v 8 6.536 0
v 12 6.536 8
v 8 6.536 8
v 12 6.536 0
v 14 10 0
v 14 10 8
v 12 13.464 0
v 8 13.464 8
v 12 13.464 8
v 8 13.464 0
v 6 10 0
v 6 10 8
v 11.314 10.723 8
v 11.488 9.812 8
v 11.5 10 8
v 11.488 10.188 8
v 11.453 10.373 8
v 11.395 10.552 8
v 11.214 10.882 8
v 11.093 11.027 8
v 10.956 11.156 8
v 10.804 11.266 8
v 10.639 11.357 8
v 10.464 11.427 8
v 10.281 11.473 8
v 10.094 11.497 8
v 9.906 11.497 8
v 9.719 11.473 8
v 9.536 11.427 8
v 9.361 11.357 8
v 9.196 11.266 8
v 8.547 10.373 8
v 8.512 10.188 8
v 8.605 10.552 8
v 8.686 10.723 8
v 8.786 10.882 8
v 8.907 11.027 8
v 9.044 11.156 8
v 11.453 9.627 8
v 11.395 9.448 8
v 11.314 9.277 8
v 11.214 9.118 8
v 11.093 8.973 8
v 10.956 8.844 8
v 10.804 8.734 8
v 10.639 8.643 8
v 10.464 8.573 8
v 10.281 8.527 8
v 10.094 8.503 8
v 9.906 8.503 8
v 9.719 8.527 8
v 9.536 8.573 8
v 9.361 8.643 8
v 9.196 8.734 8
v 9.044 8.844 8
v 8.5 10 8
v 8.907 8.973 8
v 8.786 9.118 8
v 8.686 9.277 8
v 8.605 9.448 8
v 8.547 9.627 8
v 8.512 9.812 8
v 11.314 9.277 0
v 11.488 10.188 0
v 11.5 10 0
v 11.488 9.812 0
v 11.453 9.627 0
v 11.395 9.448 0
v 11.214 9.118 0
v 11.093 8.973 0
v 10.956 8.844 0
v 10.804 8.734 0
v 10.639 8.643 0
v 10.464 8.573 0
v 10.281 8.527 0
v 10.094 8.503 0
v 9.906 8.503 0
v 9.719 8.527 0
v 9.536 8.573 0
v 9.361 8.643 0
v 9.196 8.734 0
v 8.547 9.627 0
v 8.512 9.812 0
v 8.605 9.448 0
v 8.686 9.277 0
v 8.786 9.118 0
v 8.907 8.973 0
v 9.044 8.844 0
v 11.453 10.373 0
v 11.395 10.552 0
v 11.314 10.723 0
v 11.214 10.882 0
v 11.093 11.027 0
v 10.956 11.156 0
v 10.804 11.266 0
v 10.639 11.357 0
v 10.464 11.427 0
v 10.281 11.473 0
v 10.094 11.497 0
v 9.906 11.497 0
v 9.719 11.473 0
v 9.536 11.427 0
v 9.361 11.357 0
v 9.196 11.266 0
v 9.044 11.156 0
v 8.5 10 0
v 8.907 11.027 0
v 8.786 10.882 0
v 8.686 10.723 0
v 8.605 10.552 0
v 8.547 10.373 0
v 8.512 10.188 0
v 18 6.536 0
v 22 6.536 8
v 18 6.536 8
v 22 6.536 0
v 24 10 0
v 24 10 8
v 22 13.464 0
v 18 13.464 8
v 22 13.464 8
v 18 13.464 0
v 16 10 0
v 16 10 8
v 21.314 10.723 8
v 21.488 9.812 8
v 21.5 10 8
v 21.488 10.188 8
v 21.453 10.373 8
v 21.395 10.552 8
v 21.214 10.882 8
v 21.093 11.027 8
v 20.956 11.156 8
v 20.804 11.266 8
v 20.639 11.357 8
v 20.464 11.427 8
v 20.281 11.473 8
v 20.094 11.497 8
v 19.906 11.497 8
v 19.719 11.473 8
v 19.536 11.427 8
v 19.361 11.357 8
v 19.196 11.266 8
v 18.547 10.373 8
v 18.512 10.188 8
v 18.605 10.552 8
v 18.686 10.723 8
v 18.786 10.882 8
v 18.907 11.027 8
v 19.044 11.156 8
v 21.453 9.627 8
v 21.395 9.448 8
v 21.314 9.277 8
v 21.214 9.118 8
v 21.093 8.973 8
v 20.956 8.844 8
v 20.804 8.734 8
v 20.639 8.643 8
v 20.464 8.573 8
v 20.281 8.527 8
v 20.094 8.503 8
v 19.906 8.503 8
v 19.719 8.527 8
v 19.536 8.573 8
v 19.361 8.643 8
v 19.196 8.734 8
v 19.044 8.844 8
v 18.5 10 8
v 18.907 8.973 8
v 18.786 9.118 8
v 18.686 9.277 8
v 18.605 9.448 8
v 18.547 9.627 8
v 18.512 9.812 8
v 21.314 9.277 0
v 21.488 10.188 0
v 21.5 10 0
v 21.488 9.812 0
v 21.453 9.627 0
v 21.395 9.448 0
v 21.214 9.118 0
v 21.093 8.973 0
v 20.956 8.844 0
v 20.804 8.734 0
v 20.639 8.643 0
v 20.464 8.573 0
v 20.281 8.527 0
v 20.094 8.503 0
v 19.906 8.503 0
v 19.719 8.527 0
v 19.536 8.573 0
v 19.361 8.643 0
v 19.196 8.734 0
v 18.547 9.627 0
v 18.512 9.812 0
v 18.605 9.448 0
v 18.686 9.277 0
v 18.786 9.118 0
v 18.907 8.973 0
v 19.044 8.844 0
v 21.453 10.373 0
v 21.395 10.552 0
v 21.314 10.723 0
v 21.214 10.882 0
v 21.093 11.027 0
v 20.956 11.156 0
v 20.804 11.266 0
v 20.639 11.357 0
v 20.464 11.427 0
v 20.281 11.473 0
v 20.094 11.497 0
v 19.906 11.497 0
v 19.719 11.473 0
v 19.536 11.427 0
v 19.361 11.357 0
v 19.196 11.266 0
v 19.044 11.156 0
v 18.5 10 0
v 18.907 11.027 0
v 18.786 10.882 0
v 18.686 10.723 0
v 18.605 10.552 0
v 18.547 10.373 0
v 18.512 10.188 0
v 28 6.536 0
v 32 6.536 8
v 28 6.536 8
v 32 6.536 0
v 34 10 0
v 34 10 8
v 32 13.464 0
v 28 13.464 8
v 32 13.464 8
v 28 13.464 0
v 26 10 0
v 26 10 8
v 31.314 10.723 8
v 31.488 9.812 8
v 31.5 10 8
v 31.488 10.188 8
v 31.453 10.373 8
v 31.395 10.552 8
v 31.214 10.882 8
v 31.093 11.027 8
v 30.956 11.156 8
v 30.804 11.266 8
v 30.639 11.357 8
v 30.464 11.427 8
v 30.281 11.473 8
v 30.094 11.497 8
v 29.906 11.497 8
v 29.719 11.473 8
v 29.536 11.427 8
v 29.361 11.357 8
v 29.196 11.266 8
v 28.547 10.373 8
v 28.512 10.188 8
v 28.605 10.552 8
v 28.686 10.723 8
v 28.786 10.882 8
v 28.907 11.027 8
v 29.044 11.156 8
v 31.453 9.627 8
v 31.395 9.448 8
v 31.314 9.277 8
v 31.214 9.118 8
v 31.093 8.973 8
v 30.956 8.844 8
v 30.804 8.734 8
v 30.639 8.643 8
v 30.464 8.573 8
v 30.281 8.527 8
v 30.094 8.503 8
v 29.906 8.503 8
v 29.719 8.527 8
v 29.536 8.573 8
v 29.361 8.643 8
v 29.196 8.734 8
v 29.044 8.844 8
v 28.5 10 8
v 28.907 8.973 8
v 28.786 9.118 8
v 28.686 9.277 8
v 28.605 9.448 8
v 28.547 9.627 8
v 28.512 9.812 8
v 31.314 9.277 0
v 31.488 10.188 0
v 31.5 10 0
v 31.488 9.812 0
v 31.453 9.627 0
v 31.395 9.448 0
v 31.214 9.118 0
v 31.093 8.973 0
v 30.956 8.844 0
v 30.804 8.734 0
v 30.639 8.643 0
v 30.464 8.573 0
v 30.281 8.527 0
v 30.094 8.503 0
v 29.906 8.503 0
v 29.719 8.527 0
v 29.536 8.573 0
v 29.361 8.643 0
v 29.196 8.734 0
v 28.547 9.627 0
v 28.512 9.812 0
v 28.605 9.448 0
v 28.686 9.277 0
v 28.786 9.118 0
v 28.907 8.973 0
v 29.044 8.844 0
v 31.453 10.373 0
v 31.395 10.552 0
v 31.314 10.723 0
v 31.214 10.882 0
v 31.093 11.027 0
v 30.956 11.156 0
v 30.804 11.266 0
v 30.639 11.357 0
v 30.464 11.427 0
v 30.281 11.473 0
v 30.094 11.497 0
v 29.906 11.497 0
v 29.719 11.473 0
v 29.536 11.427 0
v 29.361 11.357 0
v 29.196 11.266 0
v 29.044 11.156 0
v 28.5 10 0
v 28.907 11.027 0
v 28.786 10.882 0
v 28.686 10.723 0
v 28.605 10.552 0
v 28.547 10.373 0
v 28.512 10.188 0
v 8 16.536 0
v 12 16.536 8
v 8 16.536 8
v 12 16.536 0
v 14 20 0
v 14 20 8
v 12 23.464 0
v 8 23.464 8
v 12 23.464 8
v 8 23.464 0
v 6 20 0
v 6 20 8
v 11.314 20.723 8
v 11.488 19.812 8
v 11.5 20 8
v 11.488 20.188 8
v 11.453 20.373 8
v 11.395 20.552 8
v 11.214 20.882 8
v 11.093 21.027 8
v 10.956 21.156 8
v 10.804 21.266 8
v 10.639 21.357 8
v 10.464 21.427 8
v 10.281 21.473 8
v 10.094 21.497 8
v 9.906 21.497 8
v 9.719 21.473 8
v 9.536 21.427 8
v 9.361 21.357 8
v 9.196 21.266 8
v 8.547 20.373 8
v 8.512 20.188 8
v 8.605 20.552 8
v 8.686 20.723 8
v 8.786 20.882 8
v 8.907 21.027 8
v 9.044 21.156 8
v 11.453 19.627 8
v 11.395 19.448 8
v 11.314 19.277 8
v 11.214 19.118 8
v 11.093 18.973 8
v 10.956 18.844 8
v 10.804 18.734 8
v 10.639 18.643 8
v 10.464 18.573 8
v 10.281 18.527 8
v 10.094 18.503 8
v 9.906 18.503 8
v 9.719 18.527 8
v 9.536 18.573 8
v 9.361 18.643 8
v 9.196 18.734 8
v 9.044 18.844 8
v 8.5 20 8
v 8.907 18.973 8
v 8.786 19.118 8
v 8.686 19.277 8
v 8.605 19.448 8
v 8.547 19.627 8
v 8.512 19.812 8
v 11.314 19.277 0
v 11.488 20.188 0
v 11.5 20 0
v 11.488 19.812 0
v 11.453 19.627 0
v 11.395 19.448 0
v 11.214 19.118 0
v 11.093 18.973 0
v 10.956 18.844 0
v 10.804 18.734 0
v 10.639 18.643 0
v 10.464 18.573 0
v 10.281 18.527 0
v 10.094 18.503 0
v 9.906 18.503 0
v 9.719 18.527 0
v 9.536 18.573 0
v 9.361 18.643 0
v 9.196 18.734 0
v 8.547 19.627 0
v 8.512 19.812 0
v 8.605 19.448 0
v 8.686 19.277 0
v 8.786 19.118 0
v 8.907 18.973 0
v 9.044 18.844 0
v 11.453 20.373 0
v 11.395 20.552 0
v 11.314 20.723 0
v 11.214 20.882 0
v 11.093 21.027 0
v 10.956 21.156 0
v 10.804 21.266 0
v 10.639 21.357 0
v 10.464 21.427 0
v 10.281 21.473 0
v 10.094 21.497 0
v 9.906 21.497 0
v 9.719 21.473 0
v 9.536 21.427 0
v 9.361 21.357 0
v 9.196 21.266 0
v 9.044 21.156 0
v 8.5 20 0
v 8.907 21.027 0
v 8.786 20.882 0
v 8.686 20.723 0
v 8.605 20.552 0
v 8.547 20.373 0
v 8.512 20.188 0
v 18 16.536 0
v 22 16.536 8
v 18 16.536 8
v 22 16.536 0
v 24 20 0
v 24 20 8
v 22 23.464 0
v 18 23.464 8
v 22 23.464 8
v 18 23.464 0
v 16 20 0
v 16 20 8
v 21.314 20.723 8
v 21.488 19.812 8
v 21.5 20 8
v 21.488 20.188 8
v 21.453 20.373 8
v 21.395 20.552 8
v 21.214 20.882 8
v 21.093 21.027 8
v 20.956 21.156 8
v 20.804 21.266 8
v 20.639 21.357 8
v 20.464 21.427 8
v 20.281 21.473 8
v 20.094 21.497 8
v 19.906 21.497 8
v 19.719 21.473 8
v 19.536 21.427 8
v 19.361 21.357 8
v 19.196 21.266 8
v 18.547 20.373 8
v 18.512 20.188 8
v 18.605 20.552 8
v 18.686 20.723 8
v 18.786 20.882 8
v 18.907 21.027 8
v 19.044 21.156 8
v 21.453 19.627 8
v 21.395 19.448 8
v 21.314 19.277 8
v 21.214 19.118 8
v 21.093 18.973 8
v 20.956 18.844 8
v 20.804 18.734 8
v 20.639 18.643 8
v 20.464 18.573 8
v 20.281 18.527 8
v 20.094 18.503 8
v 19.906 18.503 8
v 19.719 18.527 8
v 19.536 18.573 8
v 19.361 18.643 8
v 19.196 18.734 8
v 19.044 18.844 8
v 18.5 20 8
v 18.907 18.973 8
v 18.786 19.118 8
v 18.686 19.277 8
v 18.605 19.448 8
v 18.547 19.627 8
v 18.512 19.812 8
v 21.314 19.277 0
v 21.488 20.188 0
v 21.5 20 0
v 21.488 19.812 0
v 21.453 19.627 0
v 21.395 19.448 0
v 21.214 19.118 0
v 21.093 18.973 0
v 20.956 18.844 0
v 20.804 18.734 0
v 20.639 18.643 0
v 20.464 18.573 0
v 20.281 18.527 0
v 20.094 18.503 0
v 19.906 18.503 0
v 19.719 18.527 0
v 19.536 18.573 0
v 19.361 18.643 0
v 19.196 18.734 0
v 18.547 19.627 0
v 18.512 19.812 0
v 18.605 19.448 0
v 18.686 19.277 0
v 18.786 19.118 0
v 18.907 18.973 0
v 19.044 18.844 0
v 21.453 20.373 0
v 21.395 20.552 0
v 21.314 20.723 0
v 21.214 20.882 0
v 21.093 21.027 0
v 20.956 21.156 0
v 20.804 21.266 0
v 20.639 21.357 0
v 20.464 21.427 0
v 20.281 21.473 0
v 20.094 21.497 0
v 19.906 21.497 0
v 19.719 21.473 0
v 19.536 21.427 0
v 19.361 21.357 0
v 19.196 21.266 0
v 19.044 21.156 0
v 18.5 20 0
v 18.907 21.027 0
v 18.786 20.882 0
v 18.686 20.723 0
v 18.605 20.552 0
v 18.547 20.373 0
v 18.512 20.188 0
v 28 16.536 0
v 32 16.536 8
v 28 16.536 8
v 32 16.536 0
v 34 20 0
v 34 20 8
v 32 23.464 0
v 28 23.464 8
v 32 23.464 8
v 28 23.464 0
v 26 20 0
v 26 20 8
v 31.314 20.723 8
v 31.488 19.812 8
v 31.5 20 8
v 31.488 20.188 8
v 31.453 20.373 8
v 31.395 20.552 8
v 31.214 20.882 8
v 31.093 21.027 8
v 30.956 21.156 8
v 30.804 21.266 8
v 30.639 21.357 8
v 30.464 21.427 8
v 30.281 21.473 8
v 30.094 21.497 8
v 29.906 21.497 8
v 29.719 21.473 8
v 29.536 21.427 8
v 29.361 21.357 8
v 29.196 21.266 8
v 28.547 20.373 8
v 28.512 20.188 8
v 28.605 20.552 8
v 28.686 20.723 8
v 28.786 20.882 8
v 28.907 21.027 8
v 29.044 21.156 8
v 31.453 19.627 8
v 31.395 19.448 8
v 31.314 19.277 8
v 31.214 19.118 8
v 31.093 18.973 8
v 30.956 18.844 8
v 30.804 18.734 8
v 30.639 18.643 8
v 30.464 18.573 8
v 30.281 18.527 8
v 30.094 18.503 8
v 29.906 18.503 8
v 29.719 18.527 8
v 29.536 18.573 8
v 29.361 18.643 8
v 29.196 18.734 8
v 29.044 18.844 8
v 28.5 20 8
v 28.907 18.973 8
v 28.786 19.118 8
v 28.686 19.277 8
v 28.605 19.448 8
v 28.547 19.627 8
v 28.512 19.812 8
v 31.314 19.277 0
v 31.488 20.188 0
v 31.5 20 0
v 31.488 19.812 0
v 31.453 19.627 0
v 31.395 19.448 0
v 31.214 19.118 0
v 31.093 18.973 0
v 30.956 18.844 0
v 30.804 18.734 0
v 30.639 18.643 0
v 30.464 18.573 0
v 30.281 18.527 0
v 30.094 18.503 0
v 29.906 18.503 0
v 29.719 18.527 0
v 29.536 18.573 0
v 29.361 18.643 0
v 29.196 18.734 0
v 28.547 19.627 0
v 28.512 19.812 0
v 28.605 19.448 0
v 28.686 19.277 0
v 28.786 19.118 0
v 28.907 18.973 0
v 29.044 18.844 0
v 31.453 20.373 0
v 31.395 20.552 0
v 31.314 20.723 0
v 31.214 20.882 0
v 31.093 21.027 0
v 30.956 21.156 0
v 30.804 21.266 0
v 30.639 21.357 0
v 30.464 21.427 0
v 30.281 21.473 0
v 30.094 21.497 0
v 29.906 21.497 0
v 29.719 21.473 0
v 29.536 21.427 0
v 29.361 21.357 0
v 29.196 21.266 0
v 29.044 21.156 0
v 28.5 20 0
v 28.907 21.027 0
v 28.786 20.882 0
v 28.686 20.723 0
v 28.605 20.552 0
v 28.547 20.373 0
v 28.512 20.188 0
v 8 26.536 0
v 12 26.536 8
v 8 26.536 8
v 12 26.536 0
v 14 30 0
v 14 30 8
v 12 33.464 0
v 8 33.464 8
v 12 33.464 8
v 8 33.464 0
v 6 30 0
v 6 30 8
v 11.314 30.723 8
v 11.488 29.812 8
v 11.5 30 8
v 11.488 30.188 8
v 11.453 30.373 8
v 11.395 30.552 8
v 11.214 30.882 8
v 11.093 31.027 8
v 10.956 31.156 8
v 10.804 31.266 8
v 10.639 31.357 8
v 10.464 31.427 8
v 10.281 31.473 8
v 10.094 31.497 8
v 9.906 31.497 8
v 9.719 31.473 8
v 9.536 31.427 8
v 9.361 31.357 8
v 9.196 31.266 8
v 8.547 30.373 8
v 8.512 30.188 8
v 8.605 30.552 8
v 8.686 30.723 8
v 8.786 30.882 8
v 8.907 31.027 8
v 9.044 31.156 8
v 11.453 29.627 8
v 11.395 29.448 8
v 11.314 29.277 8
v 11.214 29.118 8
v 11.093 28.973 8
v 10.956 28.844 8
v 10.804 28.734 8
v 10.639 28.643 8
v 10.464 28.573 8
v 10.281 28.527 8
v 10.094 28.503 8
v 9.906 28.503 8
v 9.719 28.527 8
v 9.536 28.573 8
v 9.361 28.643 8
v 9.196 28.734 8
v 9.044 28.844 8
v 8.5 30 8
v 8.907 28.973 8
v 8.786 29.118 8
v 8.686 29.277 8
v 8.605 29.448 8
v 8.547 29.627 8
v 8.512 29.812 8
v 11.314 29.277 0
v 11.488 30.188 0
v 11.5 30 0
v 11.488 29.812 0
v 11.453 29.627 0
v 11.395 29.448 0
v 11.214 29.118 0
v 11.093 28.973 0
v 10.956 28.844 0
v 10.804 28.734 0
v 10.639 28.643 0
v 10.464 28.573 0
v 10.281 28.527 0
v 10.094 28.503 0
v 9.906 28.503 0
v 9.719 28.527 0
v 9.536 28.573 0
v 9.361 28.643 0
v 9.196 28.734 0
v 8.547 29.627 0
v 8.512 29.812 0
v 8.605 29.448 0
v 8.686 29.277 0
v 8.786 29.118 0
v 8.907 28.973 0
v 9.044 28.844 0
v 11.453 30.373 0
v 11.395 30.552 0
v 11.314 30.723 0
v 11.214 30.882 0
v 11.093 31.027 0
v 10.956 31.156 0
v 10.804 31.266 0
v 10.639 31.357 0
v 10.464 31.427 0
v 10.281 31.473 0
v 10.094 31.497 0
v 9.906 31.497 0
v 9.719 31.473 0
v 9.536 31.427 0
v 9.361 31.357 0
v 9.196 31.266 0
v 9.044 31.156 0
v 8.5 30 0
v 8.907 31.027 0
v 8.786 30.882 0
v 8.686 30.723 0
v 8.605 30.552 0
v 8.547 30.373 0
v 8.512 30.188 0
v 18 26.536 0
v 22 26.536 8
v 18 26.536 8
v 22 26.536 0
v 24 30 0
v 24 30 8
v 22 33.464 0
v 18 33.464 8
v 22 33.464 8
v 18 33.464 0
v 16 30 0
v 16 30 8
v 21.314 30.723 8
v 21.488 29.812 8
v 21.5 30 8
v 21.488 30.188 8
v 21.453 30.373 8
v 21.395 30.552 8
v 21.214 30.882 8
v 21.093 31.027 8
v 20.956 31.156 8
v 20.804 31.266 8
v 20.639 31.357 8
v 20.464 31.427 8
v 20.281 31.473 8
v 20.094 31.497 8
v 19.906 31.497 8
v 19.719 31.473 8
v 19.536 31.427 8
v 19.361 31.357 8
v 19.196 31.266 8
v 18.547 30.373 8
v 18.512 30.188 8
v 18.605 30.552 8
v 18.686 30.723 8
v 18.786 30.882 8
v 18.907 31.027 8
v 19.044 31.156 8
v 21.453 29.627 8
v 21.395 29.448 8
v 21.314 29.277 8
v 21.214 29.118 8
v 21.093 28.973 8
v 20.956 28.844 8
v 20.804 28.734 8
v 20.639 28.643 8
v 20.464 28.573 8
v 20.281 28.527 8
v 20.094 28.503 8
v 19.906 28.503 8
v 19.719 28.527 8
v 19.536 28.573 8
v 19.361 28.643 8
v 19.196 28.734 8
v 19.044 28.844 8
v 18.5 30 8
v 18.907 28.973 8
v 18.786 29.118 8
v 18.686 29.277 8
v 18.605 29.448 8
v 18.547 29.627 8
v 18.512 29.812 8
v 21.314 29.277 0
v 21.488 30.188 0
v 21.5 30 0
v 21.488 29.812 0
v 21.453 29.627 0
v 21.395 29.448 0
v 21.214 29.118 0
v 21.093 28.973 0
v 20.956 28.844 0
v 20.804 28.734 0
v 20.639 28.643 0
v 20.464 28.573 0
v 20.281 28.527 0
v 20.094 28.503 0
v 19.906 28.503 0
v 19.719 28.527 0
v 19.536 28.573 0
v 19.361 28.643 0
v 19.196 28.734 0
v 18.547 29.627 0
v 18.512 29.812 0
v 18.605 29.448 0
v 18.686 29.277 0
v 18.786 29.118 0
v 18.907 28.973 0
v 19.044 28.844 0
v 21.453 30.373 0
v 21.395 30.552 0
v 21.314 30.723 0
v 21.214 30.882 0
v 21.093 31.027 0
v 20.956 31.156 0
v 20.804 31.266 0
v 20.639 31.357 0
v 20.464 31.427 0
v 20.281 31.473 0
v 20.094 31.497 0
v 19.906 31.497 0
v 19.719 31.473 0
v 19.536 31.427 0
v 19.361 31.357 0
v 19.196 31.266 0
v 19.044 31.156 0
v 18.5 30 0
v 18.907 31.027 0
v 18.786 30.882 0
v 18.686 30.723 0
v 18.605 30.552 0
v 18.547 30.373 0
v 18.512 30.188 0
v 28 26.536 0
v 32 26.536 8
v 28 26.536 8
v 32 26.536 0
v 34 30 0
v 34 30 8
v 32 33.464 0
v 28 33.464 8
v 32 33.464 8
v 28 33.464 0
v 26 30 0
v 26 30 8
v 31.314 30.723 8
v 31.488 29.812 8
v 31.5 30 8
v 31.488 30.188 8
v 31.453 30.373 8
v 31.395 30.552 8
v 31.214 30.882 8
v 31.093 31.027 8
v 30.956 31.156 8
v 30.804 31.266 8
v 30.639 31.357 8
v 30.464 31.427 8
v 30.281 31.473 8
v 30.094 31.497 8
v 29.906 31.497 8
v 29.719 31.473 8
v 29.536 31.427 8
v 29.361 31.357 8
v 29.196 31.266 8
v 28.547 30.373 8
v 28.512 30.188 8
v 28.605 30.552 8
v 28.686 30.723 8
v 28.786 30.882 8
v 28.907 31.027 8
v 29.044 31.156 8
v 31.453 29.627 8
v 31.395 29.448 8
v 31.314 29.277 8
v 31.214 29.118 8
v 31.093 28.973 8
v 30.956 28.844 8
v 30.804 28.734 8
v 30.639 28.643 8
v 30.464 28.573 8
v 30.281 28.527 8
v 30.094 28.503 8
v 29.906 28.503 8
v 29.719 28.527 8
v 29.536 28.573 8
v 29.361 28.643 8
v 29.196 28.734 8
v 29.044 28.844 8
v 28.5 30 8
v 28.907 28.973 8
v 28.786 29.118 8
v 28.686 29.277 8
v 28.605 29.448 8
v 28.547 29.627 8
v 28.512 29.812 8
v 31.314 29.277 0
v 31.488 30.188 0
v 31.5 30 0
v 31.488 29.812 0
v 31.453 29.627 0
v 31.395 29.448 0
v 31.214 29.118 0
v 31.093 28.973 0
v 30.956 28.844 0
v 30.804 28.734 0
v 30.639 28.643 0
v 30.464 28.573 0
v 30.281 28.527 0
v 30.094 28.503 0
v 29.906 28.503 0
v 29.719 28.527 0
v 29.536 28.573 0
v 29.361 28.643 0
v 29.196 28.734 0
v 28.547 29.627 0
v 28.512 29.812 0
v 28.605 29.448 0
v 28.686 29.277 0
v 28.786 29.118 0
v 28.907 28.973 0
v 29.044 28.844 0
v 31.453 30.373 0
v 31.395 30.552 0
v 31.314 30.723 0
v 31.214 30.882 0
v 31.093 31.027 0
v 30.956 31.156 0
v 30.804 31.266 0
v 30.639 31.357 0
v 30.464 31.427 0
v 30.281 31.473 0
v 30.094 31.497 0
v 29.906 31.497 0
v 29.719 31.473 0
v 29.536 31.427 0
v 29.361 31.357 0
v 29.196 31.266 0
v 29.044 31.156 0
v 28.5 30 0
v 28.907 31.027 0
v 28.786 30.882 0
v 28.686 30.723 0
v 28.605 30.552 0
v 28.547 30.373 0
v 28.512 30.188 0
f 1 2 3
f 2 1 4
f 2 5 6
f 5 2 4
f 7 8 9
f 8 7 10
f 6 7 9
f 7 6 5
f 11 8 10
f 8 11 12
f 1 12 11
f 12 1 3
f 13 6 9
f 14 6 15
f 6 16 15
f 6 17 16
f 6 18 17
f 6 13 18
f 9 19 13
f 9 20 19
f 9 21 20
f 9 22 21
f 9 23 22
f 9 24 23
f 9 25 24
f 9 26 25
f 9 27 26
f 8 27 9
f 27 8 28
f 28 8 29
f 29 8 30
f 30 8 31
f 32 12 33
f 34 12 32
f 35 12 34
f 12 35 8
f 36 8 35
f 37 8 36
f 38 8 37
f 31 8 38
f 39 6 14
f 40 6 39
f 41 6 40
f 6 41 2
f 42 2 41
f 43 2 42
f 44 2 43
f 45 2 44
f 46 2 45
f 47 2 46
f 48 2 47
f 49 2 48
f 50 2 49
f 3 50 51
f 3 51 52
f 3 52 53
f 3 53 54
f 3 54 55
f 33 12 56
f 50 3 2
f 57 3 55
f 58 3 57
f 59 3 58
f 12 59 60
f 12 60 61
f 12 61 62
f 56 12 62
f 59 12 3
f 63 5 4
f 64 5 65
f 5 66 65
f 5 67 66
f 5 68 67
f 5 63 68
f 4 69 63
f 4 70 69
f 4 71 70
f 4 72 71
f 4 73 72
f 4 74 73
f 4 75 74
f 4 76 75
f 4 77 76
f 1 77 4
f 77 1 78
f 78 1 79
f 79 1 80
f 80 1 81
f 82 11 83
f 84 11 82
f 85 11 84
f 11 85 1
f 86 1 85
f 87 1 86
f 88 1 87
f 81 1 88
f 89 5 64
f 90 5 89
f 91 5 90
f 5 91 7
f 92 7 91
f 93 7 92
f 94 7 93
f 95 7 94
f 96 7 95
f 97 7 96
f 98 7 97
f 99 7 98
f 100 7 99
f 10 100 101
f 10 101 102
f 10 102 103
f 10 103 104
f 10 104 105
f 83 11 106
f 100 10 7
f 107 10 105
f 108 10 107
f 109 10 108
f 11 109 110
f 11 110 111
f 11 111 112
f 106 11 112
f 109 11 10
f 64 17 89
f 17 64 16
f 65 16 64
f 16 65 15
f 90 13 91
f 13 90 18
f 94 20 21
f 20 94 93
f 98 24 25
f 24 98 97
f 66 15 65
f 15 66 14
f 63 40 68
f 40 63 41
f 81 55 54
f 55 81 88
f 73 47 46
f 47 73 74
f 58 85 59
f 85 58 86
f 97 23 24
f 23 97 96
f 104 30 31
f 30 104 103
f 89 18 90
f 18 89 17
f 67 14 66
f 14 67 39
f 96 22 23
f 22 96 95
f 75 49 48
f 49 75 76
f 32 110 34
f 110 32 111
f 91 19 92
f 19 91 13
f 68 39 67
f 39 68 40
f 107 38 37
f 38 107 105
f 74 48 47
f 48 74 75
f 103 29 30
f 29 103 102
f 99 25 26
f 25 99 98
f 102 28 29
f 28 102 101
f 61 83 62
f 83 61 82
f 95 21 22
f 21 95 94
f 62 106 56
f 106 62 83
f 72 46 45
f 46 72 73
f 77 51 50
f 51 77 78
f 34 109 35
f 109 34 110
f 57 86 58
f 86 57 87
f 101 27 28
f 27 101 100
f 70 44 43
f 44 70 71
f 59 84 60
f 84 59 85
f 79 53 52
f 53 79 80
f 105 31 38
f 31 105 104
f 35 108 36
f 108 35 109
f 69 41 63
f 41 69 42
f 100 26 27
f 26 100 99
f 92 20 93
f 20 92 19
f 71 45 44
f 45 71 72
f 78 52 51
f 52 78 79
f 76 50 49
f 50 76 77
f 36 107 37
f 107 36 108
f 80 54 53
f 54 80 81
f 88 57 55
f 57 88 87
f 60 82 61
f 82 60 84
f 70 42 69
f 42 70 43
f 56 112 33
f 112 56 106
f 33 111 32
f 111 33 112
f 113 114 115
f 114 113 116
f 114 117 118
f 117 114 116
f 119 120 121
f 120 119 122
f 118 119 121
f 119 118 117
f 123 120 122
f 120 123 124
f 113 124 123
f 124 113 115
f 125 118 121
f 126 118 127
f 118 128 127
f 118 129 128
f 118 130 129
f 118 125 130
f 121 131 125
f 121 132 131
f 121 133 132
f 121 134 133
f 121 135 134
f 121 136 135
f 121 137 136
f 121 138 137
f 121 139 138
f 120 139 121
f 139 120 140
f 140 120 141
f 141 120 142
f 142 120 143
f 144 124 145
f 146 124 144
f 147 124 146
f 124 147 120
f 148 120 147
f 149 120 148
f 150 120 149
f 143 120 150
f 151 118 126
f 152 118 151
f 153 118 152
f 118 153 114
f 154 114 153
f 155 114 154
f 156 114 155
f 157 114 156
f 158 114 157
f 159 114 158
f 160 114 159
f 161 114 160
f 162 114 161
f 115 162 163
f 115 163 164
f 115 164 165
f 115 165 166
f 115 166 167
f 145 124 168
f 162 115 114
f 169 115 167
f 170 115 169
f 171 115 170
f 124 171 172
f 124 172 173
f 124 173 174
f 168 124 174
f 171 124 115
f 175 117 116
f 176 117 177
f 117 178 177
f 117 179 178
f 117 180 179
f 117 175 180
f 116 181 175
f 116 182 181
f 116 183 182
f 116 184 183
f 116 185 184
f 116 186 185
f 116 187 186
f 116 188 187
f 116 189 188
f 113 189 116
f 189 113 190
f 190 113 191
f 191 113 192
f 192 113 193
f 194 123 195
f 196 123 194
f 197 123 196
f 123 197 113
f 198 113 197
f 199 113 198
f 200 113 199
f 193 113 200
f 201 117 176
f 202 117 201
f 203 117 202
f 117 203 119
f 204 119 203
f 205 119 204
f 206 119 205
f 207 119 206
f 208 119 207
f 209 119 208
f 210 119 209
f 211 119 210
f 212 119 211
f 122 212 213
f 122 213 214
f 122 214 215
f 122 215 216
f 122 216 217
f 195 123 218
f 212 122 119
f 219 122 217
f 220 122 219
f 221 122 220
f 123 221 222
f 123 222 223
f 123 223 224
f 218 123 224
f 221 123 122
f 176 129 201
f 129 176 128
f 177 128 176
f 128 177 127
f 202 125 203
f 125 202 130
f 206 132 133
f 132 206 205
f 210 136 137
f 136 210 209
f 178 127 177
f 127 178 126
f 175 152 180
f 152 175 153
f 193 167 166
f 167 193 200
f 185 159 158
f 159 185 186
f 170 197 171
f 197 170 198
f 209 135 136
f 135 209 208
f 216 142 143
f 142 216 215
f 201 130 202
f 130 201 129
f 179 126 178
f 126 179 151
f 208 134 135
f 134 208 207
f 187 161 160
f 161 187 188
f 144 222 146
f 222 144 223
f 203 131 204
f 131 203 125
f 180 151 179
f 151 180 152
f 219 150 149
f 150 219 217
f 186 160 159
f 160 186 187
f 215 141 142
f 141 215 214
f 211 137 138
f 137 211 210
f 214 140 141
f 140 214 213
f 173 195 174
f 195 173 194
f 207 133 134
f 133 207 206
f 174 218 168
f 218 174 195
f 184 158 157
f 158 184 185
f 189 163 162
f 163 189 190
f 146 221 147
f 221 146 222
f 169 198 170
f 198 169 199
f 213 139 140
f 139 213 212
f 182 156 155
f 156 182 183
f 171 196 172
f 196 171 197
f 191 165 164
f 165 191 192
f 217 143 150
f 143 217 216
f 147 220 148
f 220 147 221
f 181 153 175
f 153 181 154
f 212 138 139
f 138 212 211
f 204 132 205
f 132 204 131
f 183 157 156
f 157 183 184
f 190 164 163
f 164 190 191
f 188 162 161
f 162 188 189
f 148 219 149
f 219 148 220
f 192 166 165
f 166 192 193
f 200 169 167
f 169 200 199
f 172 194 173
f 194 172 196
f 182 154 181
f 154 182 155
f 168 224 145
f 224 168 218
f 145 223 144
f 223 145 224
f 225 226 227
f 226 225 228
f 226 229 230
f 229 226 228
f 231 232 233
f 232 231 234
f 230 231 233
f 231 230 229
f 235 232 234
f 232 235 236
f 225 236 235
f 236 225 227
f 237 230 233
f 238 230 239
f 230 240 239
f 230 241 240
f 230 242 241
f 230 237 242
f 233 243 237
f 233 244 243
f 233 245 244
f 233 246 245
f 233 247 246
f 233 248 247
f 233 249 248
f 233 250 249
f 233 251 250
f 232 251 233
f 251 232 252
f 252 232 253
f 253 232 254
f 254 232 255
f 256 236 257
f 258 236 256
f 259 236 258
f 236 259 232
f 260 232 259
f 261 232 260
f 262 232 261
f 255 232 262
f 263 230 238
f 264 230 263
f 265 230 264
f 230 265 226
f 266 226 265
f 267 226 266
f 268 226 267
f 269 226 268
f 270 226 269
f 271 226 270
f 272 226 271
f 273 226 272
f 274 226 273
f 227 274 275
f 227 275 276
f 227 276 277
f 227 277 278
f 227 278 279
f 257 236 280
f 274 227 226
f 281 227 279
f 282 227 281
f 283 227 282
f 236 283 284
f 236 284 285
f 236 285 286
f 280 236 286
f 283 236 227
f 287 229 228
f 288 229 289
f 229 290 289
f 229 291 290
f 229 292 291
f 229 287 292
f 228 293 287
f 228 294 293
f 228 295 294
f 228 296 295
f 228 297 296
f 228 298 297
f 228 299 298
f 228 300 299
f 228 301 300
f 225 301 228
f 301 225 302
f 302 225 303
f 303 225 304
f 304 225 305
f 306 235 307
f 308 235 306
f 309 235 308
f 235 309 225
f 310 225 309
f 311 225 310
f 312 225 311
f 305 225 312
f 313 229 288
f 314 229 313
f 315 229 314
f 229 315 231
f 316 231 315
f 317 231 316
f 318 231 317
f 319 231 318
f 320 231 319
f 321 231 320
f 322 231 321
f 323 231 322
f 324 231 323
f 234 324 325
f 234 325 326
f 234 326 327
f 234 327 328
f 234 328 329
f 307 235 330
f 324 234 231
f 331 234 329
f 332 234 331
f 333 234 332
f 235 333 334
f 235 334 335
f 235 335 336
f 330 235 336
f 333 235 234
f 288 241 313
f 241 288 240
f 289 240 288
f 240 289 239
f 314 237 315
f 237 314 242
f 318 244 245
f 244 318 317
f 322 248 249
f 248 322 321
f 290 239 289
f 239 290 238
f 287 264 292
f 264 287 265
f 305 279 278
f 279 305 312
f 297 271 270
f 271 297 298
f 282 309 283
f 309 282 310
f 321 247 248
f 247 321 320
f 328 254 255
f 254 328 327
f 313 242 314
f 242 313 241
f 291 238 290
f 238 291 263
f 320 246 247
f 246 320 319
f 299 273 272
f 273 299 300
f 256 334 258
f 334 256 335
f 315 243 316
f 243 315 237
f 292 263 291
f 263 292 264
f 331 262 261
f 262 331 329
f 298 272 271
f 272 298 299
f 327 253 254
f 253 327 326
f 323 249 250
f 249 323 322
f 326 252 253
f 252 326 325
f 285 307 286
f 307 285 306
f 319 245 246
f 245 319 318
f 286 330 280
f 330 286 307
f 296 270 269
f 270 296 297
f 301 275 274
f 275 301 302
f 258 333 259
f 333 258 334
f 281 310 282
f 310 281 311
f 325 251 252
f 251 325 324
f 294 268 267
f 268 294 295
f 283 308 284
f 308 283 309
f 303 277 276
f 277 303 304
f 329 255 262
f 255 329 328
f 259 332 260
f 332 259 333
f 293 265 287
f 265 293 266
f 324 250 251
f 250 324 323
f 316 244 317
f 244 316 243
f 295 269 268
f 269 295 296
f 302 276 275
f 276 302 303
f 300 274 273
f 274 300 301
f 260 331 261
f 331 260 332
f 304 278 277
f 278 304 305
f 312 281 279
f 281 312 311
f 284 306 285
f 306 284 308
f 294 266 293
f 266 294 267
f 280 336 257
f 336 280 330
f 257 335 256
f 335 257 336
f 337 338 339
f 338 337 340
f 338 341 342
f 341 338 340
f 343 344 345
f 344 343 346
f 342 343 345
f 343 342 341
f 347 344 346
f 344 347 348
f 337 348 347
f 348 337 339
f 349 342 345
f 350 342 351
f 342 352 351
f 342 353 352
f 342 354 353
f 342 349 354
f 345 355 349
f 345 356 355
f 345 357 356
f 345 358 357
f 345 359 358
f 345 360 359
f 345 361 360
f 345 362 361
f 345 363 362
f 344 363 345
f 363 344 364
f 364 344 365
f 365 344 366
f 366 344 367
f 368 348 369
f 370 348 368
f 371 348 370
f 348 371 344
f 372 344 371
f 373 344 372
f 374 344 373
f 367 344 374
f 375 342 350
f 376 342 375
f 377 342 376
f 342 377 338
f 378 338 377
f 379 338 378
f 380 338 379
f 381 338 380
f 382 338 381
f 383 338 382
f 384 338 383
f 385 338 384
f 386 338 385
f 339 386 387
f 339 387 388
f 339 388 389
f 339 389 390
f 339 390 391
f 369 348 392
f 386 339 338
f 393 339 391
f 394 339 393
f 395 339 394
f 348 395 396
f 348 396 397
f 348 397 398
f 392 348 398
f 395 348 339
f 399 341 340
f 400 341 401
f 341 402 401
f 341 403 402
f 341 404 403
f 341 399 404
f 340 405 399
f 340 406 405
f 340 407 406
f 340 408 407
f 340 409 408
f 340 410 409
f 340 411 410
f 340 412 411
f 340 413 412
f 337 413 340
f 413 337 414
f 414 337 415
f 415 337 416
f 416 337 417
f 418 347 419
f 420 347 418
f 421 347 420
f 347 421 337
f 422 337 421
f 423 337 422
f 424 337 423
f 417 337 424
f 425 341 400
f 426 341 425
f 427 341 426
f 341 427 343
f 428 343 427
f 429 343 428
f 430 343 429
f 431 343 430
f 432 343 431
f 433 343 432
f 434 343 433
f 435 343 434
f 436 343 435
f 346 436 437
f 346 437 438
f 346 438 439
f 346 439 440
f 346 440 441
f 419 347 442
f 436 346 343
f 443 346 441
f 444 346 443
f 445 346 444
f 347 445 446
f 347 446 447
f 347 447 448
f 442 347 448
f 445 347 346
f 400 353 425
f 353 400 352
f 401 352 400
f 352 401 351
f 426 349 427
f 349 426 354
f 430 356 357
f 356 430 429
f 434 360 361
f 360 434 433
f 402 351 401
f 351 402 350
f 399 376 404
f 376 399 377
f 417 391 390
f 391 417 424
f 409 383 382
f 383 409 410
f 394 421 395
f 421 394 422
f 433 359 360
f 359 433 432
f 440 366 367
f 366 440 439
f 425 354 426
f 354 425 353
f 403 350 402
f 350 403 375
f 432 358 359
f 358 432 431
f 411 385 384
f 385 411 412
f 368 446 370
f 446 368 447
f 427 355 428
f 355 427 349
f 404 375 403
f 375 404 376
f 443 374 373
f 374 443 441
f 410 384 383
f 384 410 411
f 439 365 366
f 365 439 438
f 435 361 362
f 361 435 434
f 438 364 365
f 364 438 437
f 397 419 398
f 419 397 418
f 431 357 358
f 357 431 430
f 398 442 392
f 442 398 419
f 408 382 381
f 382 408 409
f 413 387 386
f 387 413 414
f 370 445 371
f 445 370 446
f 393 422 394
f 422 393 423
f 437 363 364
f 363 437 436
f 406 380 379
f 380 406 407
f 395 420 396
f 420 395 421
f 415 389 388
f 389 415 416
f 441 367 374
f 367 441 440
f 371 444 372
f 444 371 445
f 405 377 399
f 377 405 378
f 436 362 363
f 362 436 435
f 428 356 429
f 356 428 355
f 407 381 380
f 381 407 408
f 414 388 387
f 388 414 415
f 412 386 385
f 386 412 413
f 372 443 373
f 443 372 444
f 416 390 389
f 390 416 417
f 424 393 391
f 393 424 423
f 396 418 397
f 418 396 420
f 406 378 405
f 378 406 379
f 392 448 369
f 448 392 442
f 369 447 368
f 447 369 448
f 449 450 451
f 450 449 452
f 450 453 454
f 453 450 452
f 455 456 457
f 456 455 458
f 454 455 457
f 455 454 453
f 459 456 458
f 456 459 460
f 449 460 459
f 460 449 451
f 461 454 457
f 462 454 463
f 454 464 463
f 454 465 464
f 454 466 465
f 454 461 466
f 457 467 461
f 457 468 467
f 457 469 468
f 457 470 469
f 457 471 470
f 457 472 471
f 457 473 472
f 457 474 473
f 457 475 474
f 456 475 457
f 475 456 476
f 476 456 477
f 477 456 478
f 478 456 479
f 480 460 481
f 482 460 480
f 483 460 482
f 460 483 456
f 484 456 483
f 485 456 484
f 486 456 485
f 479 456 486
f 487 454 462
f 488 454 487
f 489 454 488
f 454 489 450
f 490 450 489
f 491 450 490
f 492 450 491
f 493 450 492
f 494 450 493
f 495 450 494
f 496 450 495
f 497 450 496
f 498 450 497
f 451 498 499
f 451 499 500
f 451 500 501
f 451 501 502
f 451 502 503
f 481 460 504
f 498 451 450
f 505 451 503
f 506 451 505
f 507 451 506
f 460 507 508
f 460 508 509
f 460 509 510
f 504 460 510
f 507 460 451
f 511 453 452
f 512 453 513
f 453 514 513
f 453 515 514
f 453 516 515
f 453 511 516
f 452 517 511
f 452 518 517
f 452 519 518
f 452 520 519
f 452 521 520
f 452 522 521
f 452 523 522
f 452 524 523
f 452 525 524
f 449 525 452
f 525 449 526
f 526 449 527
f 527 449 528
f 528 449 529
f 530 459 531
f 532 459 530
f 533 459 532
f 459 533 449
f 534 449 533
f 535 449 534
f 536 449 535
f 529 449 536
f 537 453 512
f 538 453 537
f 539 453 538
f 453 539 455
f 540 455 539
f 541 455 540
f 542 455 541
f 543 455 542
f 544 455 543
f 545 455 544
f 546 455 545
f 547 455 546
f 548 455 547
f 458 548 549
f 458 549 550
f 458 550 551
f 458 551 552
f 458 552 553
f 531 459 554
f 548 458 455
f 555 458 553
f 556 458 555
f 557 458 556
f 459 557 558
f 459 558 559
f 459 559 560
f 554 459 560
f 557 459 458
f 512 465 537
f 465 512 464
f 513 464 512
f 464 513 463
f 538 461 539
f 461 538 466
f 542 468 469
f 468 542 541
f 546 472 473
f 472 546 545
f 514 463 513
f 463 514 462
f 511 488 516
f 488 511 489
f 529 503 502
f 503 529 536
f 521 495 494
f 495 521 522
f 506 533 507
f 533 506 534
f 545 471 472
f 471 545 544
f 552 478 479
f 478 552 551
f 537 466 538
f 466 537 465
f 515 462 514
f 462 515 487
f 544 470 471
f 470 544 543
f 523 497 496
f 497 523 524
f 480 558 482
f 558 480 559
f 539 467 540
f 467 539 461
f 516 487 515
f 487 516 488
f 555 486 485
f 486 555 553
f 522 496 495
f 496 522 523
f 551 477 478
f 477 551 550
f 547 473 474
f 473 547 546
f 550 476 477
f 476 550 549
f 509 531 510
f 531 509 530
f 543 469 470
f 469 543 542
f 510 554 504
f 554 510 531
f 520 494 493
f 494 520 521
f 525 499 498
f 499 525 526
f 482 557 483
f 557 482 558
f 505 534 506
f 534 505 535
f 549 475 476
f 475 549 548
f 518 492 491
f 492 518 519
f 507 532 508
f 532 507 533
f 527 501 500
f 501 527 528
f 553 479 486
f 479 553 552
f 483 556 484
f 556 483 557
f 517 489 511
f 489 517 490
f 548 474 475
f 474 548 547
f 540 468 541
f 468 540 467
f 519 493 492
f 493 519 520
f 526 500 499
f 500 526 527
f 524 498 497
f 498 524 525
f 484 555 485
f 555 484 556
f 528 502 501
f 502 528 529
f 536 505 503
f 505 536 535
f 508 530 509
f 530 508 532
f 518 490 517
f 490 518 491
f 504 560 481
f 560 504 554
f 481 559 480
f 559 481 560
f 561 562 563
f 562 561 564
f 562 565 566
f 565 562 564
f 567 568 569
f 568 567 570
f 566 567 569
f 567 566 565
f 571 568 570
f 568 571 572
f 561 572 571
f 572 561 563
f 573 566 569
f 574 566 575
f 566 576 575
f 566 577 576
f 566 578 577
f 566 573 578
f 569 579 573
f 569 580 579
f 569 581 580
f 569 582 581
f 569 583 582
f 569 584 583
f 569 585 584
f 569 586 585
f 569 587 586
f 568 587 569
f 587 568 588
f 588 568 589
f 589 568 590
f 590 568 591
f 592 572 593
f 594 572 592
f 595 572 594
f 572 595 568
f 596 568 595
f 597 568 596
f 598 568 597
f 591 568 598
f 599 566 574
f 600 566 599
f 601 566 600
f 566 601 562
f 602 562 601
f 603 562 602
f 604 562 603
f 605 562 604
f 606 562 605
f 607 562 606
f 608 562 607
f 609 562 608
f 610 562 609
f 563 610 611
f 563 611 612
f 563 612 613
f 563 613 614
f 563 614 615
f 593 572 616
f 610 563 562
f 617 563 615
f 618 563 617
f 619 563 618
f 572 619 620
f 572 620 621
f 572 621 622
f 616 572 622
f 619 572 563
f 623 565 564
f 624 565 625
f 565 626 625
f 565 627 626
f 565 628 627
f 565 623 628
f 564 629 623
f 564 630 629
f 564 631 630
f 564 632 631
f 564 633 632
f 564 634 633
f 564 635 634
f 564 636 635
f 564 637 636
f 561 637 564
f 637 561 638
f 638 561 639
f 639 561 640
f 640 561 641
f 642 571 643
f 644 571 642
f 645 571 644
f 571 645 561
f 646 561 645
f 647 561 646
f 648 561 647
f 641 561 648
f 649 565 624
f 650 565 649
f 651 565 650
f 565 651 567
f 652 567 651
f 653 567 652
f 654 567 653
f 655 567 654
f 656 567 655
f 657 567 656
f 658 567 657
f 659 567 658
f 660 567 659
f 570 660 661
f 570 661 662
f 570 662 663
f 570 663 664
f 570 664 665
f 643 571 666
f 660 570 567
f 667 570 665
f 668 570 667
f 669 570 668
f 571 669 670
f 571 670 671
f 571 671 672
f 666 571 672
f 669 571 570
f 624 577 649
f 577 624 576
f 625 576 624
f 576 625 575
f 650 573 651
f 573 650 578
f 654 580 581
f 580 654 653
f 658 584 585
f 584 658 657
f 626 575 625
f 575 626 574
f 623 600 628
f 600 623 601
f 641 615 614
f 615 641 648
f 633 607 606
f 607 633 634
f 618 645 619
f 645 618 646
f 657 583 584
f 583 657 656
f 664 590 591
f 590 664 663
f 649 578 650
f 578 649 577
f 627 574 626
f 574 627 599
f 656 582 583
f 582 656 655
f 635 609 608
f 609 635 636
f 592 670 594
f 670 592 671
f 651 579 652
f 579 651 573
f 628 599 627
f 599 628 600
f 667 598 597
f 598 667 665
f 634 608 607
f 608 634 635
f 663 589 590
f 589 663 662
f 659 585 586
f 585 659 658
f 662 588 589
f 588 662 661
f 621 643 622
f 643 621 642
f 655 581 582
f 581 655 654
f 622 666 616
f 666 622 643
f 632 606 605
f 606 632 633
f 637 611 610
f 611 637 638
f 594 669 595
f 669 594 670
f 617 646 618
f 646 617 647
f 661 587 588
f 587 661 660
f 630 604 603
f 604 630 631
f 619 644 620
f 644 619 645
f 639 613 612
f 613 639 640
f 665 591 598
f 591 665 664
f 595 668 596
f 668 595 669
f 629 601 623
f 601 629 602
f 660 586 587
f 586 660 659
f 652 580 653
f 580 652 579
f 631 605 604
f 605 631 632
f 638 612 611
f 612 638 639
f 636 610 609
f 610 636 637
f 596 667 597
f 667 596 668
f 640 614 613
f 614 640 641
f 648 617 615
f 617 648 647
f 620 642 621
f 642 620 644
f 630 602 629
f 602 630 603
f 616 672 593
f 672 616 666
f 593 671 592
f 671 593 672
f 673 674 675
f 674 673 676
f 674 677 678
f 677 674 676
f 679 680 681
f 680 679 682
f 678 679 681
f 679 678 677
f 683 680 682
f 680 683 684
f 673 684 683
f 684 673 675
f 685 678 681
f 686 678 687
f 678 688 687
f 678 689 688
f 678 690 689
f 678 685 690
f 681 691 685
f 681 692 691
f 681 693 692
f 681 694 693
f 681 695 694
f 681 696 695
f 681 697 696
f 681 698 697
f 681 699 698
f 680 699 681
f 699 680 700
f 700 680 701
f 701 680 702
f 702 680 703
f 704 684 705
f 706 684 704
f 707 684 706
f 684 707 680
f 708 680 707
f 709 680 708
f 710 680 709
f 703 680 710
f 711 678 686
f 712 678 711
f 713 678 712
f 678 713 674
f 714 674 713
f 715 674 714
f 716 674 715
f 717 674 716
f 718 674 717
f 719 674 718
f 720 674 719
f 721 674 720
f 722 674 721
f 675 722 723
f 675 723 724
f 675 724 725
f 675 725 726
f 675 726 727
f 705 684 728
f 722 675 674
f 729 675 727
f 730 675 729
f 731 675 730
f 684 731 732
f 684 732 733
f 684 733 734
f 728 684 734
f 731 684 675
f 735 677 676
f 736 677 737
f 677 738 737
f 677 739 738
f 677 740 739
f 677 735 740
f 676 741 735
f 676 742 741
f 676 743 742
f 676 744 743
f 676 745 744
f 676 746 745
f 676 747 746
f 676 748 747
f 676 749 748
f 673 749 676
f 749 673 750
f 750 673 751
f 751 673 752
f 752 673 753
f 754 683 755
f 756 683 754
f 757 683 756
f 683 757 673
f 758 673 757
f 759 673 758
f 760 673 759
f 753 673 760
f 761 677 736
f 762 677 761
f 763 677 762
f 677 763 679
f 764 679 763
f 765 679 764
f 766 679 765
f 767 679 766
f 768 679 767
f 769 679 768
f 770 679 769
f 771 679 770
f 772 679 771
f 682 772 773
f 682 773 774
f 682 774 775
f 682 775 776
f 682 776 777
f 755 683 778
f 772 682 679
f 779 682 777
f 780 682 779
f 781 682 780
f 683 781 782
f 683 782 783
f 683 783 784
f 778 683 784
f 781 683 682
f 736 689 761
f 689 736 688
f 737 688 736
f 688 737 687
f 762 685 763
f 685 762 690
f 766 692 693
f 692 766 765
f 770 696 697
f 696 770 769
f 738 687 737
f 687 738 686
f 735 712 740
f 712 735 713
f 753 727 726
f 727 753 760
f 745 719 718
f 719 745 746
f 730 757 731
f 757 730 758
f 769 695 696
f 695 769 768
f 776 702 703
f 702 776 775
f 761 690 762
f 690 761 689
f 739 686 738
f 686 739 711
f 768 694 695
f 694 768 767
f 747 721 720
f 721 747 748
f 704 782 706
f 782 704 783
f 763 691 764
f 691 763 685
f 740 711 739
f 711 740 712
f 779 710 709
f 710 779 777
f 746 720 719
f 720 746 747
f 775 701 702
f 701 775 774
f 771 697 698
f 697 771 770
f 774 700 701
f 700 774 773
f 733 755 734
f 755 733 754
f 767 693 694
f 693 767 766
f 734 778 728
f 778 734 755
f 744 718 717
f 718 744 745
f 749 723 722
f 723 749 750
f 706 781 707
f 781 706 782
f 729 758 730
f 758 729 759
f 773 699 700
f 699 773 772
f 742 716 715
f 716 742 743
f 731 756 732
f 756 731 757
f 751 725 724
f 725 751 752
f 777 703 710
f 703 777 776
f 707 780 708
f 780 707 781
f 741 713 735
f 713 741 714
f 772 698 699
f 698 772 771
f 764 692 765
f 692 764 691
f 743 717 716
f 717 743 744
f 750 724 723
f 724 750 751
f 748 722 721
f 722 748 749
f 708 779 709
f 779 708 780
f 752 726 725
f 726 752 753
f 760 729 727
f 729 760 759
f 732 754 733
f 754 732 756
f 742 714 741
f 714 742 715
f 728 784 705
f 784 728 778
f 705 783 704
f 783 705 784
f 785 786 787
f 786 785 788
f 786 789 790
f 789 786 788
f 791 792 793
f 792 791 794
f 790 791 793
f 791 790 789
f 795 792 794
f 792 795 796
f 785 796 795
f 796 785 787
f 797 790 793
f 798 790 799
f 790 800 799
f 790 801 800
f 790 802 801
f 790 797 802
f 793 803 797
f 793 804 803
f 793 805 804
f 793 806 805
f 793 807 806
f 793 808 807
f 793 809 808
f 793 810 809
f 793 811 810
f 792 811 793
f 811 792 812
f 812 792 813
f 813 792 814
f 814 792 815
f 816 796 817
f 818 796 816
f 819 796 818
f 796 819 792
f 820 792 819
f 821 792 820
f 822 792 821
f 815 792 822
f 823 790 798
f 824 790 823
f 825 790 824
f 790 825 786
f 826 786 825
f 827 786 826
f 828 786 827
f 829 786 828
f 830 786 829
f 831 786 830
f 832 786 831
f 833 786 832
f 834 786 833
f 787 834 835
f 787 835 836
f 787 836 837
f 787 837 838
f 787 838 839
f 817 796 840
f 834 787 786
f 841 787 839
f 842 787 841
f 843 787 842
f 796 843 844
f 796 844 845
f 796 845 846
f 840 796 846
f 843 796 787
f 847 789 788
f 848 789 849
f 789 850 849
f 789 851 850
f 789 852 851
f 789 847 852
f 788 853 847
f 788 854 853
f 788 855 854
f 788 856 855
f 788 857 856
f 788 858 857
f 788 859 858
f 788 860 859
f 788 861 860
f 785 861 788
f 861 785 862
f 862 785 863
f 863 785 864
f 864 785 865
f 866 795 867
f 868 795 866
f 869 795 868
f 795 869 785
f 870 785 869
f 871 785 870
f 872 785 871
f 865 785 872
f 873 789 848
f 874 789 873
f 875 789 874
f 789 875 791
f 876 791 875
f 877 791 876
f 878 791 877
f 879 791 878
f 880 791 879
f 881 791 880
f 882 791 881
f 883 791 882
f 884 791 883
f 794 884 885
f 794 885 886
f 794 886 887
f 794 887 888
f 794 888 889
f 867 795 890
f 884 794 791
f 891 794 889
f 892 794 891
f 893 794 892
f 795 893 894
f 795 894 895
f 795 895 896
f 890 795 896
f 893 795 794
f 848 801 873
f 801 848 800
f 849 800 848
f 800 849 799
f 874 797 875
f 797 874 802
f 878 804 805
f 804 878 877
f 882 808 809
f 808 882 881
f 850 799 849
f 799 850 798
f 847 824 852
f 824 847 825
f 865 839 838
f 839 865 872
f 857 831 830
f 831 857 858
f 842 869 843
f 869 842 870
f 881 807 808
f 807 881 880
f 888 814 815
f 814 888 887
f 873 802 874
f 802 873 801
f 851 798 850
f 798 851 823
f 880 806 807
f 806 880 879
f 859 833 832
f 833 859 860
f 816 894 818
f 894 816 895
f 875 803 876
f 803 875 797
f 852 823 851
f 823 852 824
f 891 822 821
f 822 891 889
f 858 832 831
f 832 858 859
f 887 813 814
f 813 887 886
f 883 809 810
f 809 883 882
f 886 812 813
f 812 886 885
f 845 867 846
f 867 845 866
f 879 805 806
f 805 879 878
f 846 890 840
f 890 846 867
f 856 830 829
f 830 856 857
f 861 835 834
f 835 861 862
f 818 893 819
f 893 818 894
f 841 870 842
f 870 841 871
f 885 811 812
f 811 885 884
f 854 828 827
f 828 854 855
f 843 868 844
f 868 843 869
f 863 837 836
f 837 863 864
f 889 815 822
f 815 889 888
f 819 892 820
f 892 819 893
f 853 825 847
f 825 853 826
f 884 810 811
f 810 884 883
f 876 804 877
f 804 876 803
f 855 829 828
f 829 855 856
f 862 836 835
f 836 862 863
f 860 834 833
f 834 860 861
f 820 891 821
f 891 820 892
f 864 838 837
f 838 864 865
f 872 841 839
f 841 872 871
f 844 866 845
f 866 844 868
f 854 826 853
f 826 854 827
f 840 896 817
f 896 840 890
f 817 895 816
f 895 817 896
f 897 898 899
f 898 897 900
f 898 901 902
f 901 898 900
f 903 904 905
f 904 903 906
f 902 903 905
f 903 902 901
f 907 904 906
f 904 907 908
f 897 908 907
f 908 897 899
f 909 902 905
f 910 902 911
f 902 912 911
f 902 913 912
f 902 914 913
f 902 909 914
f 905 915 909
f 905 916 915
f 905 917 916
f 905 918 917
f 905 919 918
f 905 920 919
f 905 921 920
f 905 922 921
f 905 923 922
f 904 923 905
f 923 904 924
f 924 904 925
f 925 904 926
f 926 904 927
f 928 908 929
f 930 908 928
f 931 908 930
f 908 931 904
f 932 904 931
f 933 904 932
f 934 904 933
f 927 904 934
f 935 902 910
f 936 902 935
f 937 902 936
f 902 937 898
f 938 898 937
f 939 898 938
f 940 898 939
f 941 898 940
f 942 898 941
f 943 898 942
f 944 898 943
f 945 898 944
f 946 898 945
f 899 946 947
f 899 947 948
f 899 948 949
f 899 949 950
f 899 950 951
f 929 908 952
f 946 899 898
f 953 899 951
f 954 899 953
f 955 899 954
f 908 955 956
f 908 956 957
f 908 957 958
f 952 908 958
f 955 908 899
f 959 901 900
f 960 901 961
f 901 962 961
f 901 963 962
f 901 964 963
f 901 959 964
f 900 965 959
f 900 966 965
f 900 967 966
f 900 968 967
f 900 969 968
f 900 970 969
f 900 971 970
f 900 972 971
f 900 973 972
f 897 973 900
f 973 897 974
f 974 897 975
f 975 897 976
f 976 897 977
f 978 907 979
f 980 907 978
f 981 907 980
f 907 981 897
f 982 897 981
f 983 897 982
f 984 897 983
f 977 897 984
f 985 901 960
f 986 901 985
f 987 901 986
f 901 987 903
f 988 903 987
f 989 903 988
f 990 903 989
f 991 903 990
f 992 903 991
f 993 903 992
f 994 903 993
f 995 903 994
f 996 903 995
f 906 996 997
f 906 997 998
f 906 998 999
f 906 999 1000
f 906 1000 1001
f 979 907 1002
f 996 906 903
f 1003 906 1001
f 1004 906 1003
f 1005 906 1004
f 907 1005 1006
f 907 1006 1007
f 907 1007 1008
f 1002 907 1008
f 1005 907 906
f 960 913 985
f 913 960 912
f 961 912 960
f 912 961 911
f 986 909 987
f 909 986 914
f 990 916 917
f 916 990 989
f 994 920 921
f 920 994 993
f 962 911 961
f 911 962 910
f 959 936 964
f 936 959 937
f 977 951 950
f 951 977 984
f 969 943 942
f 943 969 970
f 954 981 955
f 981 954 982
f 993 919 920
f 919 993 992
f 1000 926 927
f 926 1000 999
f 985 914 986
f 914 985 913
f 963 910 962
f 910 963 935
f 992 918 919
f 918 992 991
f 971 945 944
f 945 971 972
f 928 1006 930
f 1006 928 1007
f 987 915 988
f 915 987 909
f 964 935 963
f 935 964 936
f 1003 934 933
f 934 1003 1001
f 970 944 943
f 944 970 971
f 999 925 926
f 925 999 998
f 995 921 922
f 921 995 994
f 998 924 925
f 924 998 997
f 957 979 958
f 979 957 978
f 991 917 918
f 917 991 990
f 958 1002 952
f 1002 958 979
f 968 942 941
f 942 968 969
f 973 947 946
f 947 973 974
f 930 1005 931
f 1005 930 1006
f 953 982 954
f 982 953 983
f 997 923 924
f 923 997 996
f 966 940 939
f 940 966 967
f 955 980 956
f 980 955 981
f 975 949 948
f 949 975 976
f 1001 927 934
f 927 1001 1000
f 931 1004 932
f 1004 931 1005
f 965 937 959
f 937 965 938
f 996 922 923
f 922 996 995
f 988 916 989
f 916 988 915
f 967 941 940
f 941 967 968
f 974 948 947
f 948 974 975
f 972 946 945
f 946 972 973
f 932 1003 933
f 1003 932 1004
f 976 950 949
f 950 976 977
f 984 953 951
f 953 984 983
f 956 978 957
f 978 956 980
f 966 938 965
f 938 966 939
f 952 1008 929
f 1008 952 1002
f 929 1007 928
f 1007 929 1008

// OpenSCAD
hole_r = 1.5;
hex_r = 4; 
hex_Height = 8;
Rows = 3;
Cols= 3;

module pcbstand() {
difference() {
    cylinder(r=hex_r,h=hex_Height,$fn=6);
    translate([0,0,-1])cylinder(r=hole_r,h=hex_Height+2,$fn=50);

}
}
for (y=[1:Cols])
    for (x=[1:Rows])
        translate([x*((hex_r*2)+2),y*((hex_r*2)+2),0])pcbstand();
